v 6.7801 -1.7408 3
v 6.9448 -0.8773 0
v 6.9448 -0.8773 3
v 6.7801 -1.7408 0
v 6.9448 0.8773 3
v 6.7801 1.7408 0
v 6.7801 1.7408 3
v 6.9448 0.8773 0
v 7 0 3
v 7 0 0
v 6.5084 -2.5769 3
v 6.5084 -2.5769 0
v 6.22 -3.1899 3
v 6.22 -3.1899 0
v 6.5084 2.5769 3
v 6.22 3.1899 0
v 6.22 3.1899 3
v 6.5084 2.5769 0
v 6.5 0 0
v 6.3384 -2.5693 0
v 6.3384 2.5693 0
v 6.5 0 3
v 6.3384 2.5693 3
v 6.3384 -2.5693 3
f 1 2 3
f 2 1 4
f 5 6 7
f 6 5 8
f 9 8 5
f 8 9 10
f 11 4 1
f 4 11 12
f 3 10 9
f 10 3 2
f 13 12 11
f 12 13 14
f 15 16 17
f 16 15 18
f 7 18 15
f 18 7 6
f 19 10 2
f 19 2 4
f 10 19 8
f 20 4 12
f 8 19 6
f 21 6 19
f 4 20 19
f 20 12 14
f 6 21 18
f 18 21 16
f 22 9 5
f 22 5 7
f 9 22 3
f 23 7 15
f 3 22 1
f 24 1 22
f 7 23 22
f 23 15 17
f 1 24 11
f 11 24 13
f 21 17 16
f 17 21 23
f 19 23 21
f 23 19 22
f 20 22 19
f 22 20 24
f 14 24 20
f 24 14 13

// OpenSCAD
$fn = 50;


difference() {
	union() {
		cylinder(h = 3, r = 7.0000000000);
		translate(v = [-17.0000000000, 0, 0]) {
			cylinder(h = 3, r = 7.0000000000);
		}
	}
	union() {
		cylinder(h = 3, r = 3.2500000000);
		cylinder(h = 3, r = 1.8000000000);
		cylinder(h = 3, r = 1.8000000000);
		cylinder(h = 3, r = 1.8000000000);
		translate(v = [-21.5000000000, 0, 0]) {
			hull() {
				translate(v = [-3.7500000000, 0.0000000000, 0]) {
					cylinder(h = 3, r = 10.5000000000);
				}
				translate(v = [3.7500000000, 0.0000000000, 0]) {
					cylinder(h = 3, r = 10.5000000000);
				}
				translate(v = [-3.7500000000, -0.0000000000, 0]) {
					cylinder(h = 3, r = 10.5000000000);
				}
				translate(v = [3.7500000000, -0.0000000000, 0]) {
					cylinder(h = 3, r = 10.5000000000);
				}
			}
		}
		translate(v = [-14.0000000000, 0, 0.0000000000]) {
			cylinder(h = 3, r = 20.5000000000);
		}
	}
}
